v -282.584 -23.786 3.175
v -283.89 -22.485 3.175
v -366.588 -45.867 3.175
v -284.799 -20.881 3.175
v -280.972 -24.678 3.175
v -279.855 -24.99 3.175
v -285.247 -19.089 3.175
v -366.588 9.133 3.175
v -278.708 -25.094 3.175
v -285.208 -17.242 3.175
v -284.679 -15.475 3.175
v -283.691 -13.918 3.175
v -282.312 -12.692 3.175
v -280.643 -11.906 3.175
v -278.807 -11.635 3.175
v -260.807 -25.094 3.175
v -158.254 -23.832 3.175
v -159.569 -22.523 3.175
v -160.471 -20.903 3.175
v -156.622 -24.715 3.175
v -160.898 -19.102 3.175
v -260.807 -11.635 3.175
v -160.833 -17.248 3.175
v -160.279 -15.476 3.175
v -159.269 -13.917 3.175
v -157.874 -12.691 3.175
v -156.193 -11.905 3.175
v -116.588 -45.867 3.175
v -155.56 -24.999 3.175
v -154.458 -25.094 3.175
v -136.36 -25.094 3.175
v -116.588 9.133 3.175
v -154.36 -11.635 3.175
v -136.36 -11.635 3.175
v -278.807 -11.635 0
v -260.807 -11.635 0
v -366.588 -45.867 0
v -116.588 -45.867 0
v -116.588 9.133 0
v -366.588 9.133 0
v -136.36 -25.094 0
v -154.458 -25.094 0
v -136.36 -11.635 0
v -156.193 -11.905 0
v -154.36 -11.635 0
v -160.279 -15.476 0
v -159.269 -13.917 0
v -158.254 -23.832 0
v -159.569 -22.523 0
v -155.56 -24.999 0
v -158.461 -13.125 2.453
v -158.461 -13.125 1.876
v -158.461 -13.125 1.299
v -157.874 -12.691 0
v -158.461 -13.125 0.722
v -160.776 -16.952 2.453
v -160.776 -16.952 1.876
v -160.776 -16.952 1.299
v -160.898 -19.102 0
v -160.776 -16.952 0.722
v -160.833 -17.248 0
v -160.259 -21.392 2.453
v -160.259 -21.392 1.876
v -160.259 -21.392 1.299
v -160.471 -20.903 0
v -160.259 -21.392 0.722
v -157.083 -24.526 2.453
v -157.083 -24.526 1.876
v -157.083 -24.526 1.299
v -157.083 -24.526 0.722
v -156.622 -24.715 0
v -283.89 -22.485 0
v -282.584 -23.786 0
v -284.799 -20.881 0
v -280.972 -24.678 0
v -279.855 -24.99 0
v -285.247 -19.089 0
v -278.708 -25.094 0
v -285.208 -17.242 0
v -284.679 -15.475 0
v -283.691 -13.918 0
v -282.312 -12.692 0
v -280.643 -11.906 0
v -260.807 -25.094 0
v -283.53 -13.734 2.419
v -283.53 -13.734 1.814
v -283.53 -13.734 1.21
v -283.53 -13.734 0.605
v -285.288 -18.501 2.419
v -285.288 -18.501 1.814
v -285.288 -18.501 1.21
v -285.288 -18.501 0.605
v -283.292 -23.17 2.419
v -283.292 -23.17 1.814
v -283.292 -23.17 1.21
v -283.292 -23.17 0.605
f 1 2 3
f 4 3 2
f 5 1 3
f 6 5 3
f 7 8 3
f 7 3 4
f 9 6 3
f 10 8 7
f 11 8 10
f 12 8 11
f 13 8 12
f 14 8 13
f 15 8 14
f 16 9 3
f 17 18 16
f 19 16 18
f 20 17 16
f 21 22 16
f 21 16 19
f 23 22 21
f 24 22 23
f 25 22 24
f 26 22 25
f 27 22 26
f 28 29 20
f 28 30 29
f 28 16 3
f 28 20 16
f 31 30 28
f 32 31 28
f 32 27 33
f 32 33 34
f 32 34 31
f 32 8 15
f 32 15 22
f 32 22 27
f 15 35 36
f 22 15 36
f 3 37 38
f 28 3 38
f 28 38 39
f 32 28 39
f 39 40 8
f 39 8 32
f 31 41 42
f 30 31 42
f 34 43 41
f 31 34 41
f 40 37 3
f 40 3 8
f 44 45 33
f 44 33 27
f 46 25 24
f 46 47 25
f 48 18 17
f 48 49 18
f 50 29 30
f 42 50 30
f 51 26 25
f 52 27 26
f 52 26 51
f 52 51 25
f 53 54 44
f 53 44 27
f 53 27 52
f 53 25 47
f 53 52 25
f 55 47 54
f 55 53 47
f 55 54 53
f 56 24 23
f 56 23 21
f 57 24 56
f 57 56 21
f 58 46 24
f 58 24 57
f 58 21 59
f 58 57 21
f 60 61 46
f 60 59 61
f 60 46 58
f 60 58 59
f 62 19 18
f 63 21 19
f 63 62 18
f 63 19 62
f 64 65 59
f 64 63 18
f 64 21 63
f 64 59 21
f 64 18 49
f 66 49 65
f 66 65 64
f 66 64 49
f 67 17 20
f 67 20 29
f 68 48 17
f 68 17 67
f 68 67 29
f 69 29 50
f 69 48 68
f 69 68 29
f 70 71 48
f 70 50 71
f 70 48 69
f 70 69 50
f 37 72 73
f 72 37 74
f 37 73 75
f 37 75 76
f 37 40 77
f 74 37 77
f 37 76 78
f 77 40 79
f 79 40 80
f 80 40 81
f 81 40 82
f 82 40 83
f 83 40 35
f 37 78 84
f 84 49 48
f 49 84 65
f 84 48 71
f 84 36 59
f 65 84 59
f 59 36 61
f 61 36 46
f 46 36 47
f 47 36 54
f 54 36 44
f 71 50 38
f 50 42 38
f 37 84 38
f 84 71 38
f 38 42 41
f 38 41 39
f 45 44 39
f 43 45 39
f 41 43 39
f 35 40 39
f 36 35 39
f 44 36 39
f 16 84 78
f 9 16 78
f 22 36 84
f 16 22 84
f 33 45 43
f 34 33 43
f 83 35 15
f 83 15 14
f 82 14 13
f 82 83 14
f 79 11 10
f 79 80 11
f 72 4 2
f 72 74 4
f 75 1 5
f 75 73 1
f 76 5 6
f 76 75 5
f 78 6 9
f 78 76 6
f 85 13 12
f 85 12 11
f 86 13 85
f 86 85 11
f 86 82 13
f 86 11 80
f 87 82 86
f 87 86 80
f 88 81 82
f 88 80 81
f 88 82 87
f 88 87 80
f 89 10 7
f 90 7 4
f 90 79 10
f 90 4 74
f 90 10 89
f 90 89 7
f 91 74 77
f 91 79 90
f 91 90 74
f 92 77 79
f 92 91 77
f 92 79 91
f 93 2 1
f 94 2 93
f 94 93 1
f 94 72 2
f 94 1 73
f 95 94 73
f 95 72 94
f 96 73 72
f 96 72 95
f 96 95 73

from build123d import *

# Parameters (mm, degrees)
SKETCH1_W           = 250
SKETCH1_H           = 55
BOSS_EXTRUDE1_DEPTH = 3.175


with BuildPart() as part:
    # Sketch1 → Boss-Extrude1 (new body)
    with BuildSketch(Plane.XY):
        with Locations((-241.58829827, -18.367364772)):
            Rectangle(SKETCH1_W, SKETCH1_H)
        with BuildLine():
            Line((-278.807431502, -11.635308713), (-260.807431502, -11.635308713))
            Line((-260.807431502, -11.635308713), (-260.807431502, -25.094140403))
            Line((-260.807431502, -25.094140403), (-278.708074604, -25.094140403))
            add(Edge.make_bspline(
                [(-278.807431502, -11.635308713), (-278.842567637, -11.635308713), (-278.877724877, -11.635597737), (-279.131916675, -11.639782512), (-279.34983121, -11.654506754), (-279.783435066, -11.706373741), (-280.000022761, -11.743764607), (-280.637043124, -11.888179154), (-281.046210232, -12.026893167), (-281.834248732, -12.387198003), (-282.214784616, -12.611112168), (-282.91286176, -13.122553874), (-283.23487643, -13.411547156), (-283.824414261, -14.056624874), (-284.084709523, -14.405325127), (-284.420910809, -14.959373126), (-284.524173104, -15.149599512), (-284.712815972, -15.541311056), (-284.798455074, -15.743725981), (-285.023266518, -16.356140938), (-285.132324707, -16.77404955), (-285.270965185, -17.628621863), (-285.299780117, -18.068728441), (-285.276335696, -18.934229846), (-285.225127225, -19.363108441), (-285.086887053, -20.000402626), (-285.030151101, -20.212732347), (-284.897978299, -20.627014671), (-284.822460465, -20.829775079), (-284.568196741, -21.425185334), (-284.362007249, -21.805088054), (-283.873373823, -22.529474489), (-283.596617119, -22.864951248), (-283.139203055, -23.322938066), (-282.979382751, -23.468376569), (-282.6446555, -23.744423912), (-282.468681353, -23.875710362), (-281.925950724, -24.240109672), (-281.545469248, -24.444161396), (-280.747183384, -24.774500883), (-280.324174276, -24.901275116), (-279.505292308, -25.056948004), (-279.108516523, -25.094140403), (-278.708074604, -25.094140403)],
                knots=[0.997490672, 0.997490672, 0.997490672, 0.997490672, 1, 1, 1.015625, 1.015625, 1.03125, 1.03125, 1.0625, 1.0625, 1.09375, 1.09375, 1.125, 1.125, 1.15625, 1.15625, 1.171875, 1.171875, 1.1875, 1.1875, 1.21875, 1.21875, 1.25, 1.25, 1.28125, 1.28125, 1.296875, 1.296875, 1.3125, 1.3125, 1.34375, 1.34375, 1.375, 1.375, 1.390625, 1.390625, 1.40625, 1.40625, 1.4375, 1.4375, 1.46875, 1.46875, 1.497597951, 1.497597951, 1.497597951, 1.497597951], degree=3))
        make_face(mode=Mode.SUBTRACT)
        with BuildLine():
            Line((-154.360316654, -11.635298321), (-136.360316654, -11.635298321))
            Line((-136.360316654, -11.635298321), (-136.360316654, -25.09414087))
            Line((-136.360316654, -25.09414087), (-154.458489548, -25.09414087))
            add(Edge.make_bspline(
                [(-154.360316654, -11.635298321), (-154.761727997, -11.635298321), (-155.157386504, -11.672727127), (-155.759665345, -11.787140661), (-155.970243269, -11.838376709), (-156.387966493, -11.963181969), (-156.594872022, -12.036850346), (-157.196347851, -12.28608082), (-157.576755859, -12.490915834), (-158.117253538, -12.854781423), (-158.293226627, -12.986353957), (-158.628820603, -13.263982392), (-158.788816486, -13.410133743), (-159.246155666, -13.869889244), (-159.521251185, -14.204841131), (-160.009167015, -14.931608928), (-160.214692704, -15.312488329), (-160.467795081, -15.908929825), (-160.542897196, -16.111961519), (-160.674225623, -16.52661774), (-160.730530769, -16.739037016), (-160.867597895, -17.37656092), (-160.918148194, -17.805473824), (-160.940601815, -18.670806399), (-160.911402505, -19.110937169), (-160.772322277, -19.965020543), (-160.663242958, -20.382313943), (-160.438953589, -20.993295919), (-160.353444122, -21.195550415), (-160.164485449, -21.587994273), (-160.061148171, -21.778323473), (-159.725133032, -22.332012421), (-159.46672666, -22.678256324), (-158.877844125, -23.322799834), (-158.553373423, -23.613738751), (-158.031112315, -23.995810431), (-157.850620858, -24.114523058), (-157.476451569, -24.334149523), (-157.281538298, -24.435580841), (-156.686819382, -24.706814458), (-156.277513308, -24.844436489), (-155.433635452, -25.034586177), (-154.994831316, -25.08641844), (-154.527357053, -25.093865983), (-154.492916253, -25.09414087), (-154.458489548, -25.09414087)],
                knots=[0.002538772, 0.002538772, 0.002538772, 0.002538772, 0.03125, 0.03125, 0.046875, 0.046875, 0.0625, 0.0625, 0.09375, 0.09375, 0.109375, 0.109375, 0.125, 0.125, 0.15625, 0.15625, 0.1875, 0.1875, 0.203125, 0.203125, 0.21875, 0.21875, 0.25, 0.25, 0.28125, 0.28125, 0.3125, 0.3125, 0.328125, 0.328125, 0.34375, 0.34375, 0.375, 0.375, 0.40625, 0.40625, 0.421875, 0.421875, 0.4375, 0.4375, 0.46875, 0.46875, 0.5, 0.5, 0.502486526, 0.502486526, 0.502486526, 0.502486526], degree=3))
        make_face(mode=Mode.SUBTRACT)
    extrude(amount=BOSS_EXTRUDE1_DEPTH)


solid = part.part
